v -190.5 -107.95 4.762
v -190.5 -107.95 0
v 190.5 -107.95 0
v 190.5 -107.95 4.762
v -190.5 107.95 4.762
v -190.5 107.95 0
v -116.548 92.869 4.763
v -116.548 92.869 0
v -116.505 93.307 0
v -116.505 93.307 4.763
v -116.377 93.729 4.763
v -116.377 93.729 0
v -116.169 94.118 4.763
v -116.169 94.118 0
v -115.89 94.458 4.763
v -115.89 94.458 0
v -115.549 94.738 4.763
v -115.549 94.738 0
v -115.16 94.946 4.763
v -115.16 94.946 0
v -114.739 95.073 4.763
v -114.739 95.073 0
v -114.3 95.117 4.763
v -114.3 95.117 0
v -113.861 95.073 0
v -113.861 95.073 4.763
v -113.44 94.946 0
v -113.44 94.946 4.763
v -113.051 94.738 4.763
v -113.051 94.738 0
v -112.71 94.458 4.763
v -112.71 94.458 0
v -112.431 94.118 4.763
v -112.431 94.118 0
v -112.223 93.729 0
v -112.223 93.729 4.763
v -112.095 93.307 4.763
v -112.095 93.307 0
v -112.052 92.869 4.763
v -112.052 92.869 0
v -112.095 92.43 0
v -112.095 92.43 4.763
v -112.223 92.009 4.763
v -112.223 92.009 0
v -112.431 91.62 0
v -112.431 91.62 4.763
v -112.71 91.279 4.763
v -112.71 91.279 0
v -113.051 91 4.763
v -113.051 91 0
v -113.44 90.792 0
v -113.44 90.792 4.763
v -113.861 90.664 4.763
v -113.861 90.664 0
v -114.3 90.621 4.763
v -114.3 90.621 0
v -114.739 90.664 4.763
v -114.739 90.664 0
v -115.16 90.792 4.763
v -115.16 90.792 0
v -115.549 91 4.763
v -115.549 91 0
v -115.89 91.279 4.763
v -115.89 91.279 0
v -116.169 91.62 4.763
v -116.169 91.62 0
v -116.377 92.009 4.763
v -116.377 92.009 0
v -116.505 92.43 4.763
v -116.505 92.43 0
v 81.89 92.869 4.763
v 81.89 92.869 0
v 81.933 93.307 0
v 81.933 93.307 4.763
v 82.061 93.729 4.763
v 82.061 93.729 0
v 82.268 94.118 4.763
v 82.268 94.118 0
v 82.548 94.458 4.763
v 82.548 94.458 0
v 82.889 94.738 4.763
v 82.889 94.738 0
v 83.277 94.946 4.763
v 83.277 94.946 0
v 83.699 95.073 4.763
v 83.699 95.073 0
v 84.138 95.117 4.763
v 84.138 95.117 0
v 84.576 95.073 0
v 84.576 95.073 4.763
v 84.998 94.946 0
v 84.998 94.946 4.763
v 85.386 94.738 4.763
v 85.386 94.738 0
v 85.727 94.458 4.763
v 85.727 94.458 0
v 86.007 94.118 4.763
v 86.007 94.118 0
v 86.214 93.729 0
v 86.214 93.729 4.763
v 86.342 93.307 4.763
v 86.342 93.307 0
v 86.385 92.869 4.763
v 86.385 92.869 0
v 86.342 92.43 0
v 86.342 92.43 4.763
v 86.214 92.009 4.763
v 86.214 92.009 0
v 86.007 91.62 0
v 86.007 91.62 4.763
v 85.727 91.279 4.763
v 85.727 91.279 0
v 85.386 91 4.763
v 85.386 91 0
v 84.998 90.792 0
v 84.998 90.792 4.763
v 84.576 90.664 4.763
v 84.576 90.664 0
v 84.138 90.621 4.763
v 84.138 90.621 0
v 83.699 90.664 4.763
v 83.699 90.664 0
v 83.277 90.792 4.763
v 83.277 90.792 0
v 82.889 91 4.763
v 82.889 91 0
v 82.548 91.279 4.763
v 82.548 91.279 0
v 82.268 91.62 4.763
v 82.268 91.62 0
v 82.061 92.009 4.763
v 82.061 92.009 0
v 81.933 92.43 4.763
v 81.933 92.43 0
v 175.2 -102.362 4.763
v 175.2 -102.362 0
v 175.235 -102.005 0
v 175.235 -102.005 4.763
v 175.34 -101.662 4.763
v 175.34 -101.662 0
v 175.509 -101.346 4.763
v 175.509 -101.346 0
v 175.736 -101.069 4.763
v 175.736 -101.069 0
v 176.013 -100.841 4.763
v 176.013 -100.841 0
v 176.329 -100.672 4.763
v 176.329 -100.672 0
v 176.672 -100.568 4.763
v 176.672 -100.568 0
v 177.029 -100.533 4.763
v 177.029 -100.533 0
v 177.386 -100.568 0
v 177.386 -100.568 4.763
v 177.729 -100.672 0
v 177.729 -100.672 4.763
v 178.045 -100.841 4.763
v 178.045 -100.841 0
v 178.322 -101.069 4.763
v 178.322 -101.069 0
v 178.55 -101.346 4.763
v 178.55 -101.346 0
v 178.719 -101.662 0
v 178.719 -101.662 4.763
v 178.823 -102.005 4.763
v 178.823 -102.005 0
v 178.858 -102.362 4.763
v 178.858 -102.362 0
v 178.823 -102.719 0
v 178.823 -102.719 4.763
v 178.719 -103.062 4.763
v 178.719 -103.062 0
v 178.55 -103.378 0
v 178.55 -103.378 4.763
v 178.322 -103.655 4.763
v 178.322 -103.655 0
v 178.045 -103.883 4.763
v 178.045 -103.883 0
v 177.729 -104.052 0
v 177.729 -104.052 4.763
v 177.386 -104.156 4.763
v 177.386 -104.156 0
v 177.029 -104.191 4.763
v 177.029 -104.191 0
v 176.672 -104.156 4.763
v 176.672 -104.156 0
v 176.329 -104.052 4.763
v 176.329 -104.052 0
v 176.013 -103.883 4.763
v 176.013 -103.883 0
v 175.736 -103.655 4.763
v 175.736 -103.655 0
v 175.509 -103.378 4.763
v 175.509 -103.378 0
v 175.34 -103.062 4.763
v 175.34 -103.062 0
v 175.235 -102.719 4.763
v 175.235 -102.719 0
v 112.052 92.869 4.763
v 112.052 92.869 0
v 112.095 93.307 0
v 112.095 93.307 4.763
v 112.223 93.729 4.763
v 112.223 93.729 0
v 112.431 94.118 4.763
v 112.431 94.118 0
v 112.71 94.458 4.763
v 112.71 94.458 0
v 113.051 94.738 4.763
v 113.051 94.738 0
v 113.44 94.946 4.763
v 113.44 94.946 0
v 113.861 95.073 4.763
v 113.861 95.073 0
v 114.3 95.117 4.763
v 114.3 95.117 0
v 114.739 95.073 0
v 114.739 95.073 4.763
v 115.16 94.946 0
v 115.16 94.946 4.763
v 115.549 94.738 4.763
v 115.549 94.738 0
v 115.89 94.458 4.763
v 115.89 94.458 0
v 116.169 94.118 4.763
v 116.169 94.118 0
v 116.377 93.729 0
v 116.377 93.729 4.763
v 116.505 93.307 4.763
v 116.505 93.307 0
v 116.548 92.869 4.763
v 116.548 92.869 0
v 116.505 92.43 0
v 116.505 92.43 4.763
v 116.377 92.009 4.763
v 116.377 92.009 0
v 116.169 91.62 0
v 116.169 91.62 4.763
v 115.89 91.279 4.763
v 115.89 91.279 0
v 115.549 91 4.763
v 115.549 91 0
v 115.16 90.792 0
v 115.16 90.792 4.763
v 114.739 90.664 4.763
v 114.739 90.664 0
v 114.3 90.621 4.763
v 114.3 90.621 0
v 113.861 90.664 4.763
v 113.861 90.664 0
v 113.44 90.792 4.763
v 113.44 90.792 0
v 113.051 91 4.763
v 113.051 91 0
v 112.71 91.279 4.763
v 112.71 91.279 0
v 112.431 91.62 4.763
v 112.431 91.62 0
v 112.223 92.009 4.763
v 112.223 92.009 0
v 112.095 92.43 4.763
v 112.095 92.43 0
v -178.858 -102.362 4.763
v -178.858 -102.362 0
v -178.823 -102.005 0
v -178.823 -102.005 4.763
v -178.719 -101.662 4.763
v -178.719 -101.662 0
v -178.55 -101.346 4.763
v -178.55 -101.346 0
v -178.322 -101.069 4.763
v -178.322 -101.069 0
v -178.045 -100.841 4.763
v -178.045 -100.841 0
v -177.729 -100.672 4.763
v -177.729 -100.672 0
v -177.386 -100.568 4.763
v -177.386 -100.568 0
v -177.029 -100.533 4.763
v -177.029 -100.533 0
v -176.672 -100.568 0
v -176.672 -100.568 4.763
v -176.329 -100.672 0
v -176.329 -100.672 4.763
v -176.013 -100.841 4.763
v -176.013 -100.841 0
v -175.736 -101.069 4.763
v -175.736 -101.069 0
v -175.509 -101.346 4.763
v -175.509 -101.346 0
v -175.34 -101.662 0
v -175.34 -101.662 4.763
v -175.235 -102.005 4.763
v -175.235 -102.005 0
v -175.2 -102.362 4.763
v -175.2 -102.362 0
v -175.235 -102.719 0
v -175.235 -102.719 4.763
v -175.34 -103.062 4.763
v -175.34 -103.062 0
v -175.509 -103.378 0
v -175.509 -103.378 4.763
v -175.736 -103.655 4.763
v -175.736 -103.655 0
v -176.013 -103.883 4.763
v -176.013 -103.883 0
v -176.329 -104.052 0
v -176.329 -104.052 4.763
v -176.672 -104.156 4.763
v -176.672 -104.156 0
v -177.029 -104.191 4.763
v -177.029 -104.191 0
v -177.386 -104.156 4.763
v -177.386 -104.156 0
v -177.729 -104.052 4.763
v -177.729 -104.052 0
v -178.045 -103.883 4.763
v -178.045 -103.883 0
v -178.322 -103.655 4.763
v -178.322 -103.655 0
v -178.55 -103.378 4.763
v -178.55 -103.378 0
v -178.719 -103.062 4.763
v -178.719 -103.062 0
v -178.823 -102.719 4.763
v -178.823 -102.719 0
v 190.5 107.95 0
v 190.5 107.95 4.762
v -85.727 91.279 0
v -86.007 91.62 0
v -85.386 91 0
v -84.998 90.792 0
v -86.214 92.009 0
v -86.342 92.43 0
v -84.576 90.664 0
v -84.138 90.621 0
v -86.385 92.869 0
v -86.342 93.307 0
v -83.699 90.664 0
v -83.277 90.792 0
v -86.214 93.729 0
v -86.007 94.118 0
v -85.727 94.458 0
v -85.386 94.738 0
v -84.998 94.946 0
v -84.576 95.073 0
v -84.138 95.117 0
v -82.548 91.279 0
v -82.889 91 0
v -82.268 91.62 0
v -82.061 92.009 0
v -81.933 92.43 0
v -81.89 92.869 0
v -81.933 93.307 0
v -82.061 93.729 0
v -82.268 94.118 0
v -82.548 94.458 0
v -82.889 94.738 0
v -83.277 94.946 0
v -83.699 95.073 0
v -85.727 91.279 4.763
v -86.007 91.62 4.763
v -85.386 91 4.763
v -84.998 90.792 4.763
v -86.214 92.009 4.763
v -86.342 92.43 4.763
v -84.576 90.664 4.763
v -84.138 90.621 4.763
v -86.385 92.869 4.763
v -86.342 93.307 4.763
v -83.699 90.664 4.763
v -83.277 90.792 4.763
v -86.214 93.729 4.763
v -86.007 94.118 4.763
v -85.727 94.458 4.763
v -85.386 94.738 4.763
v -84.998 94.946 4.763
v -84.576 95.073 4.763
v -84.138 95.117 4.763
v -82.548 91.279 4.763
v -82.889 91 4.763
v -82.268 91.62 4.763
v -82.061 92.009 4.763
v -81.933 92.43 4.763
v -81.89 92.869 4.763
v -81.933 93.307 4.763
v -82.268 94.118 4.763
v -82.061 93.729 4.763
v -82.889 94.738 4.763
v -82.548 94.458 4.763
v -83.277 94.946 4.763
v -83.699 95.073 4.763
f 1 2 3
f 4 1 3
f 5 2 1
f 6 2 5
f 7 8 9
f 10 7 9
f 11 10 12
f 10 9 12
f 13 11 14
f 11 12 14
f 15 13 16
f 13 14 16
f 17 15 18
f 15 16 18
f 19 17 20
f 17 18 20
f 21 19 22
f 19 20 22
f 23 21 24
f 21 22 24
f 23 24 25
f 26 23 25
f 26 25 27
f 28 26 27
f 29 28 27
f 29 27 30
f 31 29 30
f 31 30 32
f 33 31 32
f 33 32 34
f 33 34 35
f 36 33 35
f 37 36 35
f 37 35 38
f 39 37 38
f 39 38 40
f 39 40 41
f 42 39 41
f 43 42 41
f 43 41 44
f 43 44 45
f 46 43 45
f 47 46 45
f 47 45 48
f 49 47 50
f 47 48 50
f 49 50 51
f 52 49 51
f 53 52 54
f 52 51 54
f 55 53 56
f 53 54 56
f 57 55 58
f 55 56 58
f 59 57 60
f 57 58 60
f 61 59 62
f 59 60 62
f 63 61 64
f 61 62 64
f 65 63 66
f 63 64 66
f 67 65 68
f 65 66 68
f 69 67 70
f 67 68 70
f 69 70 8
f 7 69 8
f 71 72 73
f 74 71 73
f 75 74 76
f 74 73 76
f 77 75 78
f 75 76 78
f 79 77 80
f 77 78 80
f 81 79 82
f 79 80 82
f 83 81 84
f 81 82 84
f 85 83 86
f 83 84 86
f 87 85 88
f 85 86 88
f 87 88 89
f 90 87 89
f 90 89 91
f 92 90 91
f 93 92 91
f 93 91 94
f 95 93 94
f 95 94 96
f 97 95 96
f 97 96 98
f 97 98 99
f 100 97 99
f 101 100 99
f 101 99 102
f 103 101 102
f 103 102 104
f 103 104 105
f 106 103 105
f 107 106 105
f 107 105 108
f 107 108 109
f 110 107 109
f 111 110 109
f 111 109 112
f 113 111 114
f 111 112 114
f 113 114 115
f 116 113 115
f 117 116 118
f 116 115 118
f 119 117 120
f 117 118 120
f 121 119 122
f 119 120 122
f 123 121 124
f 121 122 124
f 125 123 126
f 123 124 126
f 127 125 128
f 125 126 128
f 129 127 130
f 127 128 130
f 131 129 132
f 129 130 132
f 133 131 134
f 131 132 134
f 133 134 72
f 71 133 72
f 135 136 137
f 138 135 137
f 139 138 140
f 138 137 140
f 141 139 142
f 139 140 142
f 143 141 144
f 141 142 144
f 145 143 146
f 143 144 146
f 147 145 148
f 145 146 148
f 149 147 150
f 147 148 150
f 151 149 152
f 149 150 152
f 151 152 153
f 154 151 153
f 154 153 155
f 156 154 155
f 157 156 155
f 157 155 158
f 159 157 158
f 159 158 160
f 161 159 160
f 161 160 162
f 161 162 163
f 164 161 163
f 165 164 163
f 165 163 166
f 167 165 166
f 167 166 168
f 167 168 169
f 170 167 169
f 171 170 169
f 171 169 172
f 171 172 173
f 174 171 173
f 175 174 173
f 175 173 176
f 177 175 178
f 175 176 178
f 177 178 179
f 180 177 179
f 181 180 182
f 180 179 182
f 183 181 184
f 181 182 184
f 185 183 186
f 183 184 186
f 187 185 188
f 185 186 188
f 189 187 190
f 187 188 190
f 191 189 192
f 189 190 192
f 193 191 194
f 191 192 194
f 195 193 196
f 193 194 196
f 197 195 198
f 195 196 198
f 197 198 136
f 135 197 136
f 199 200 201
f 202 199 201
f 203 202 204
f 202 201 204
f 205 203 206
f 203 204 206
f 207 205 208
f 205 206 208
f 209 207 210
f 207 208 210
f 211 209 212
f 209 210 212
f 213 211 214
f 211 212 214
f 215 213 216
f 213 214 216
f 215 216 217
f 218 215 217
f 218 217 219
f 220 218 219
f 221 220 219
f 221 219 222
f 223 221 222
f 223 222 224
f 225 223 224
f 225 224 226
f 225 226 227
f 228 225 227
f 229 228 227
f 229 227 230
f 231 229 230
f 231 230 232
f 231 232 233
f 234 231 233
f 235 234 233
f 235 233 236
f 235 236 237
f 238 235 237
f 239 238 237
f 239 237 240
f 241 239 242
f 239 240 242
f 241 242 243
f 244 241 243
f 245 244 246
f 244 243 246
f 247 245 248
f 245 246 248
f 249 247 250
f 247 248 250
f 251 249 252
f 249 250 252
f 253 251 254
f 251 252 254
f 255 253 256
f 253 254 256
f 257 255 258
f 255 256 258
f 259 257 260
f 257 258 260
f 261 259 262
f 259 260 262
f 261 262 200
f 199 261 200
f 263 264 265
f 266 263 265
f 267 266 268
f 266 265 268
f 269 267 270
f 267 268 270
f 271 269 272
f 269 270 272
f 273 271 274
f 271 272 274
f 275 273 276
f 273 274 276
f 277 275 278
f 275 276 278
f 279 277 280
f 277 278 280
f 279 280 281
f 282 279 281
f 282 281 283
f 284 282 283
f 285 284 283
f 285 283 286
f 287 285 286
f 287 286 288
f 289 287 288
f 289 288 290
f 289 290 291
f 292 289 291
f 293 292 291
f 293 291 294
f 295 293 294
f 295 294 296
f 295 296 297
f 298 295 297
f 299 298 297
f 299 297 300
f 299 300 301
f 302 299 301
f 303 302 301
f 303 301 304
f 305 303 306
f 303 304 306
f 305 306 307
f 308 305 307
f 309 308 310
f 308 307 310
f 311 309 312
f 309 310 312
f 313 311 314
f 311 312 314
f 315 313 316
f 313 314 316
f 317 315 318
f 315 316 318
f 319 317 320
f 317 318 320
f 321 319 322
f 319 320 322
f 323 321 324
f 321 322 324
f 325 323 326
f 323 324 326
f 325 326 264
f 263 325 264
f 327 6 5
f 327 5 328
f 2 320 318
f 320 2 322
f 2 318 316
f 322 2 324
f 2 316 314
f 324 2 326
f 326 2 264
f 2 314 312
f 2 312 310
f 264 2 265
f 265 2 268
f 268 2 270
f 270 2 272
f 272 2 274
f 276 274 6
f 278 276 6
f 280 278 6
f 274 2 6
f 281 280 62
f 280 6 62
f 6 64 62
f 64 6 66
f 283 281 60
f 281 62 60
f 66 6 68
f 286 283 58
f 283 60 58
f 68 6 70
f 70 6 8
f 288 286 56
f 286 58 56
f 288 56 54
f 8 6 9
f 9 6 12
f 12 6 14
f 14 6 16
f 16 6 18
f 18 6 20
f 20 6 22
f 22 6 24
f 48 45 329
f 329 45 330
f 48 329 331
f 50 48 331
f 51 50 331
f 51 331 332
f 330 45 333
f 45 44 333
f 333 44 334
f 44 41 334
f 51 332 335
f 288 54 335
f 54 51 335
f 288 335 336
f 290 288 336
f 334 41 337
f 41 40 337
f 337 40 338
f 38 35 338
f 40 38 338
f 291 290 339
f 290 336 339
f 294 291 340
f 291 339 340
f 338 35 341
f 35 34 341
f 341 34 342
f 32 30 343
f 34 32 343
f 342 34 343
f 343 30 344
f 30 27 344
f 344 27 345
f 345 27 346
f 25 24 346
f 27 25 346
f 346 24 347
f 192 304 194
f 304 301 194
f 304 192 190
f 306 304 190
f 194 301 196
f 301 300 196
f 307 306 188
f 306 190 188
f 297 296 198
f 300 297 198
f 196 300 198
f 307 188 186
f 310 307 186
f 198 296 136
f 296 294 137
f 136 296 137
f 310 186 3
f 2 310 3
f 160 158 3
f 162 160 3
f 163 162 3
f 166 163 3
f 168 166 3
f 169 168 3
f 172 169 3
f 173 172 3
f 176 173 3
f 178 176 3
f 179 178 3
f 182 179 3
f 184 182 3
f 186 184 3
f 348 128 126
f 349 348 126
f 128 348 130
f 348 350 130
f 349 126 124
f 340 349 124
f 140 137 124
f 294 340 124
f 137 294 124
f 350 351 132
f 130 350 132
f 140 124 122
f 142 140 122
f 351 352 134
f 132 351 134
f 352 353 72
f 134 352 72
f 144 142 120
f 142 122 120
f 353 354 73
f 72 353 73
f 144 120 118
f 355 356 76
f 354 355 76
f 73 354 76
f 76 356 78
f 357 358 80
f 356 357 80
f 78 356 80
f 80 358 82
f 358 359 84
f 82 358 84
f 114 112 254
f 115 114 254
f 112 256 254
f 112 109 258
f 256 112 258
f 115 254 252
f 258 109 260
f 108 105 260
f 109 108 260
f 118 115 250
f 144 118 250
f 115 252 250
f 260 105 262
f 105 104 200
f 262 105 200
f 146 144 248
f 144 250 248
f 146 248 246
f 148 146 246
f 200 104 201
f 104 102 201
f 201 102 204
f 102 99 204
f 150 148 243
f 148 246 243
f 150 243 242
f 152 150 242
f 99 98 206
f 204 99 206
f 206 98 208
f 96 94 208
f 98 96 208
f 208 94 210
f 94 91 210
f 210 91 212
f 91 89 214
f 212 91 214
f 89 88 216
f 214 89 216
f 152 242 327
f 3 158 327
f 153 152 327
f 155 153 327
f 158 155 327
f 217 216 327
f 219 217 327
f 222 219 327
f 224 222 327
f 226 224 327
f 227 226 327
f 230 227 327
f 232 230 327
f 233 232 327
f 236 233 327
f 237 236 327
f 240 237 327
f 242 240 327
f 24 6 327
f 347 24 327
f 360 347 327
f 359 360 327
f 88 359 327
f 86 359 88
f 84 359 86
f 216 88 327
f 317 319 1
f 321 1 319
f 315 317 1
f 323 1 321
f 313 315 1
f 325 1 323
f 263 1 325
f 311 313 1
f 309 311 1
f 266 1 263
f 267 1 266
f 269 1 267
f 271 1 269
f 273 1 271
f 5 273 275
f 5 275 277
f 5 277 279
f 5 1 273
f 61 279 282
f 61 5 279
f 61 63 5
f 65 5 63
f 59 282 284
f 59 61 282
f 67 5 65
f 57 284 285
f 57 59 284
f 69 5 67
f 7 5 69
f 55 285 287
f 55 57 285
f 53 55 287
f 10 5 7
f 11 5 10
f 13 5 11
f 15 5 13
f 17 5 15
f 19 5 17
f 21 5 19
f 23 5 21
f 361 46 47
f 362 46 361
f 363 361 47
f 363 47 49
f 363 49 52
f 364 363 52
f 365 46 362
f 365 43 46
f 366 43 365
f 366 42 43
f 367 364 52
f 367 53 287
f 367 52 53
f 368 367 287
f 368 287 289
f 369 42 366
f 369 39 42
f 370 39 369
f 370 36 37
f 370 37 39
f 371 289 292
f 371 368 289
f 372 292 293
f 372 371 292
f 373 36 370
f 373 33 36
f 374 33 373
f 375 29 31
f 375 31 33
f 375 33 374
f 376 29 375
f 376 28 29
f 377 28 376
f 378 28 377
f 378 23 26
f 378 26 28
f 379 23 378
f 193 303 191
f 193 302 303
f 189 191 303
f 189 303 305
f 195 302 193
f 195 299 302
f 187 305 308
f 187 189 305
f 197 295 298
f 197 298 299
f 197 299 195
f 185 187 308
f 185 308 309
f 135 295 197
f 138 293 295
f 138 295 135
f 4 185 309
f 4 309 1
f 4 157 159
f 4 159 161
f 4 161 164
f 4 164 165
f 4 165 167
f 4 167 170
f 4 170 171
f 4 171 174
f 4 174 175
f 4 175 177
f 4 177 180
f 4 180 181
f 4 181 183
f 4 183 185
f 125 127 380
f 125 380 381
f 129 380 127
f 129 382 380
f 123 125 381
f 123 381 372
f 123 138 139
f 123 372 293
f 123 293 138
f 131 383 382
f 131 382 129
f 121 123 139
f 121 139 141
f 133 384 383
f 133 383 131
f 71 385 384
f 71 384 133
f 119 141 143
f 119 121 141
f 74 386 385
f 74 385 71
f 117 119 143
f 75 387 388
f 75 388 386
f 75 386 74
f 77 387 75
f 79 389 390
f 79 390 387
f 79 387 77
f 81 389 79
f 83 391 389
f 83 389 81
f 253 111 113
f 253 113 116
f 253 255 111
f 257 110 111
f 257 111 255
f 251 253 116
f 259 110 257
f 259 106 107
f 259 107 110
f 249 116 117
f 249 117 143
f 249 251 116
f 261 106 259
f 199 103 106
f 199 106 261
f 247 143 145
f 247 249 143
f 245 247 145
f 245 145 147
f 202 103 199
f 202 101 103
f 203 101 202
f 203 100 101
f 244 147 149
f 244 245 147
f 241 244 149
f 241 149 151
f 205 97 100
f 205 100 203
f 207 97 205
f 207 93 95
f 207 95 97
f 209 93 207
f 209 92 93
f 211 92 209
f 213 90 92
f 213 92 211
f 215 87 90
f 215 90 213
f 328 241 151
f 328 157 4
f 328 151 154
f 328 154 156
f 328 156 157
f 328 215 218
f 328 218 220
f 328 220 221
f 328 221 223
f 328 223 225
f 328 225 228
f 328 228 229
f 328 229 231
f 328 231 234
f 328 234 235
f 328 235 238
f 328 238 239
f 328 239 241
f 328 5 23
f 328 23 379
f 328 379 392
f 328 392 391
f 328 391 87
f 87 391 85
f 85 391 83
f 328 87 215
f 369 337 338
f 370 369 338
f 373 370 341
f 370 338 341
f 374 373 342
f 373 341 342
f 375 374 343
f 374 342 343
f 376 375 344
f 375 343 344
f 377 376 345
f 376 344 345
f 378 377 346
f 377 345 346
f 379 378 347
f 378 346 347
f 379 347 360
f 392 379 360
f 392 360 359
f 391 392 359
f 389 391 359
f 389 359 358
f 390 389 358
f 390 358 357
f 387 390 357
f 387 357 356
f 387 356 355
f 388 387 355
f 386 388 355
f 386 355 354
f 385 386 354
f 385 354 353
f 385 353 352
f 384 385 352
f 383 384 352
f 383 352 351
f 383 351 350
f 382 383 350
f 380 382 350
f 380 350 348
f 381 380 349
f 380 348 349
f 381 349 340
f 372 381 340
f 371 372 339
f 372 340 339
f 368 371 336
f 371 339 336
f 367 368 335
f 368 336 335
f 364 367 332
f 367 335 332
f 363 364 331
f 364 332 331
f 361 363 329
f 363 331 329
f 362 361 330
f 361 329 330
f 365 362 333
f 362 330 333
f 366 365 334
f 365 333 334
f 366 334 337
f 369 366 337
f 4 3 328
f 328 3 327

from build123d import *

# Parameters (mm, degrees)
SKETCH1_W                 = 381
SKETCH1_H                 = 215.9
BOSS_EXTRUDE1_DEPTH       = 4.7625
F_8_CLEARANCE_HOLE1_D     = 4.4958
F_8_CLEARANCE_HOLE1_DEPTH = 74.422
F_8_CLEARANCE_HOLE1_TIP   = 1.350674586
F_6_CLEARANCE_HOLE1_D     = 3.6576
F_6_CLEARANCE_HOLE1_DEPTH = 74.422
F_6_CLEARANCE_HOLE1_TIP   = 1.0988539


with BuildPart() as part:
    # Sketch1 → Boss-Extrude1 (new body)
    with BuildSketch(Plane.XY):
        Rectangle(SKETCH1_W, SKETCH1_H)
    extrude(amount=BOSS_EXTRUDE1_DEPTH)

    # #8 Clearance Hole1
    with Locations(Plane.XY.offset(4.7625)):
        with Locations((-114.3, 92.86875), (-84.1375, 92.86875), (84.1375, 92.86875), (114.3, 92.86875)):
            Hole(F_8_CLEARANCE_HOLE1_D / 2, depth=F_8_CLEARANCE_HOLE1_DEPTH)
            with Locations((0, 0, -(F_8_CLEARANCE_HOLE1_DEPTH + F_8_CLEARANCE_HOLE1_TIP / 2))):  # 118° drill point
                Cone(0, F_8_CLEARANCE_HOLE1_D / 2, F_8_CLEARANCE_HOLE1_TIP, mode=Mode.SUBTRACT)

    # #6 Clearance Hole1
    with Locations(Plane.XY.offset(4.7625)):
        with Locations((-177.02911, -102.362), (177.02911, -102.362)):
            Hole(F_6_CLEARANCE_HOLE1_D / 2, depth=F_6_CLEARANCE_HOLE1_DEPTH)
            with Locations((0, 0, -(F_6_CLEARANCE_HOLE1_DEPTH + F_6_CLEARANCE_HOLE1_TIP / 2))):  # 118° drill point
                Cone(0, F_6_CLEARANCE_HOLE1_D / 2, F_6_CLEARANCE_HOLE1_TIP, mode=Mode.SUBTRACT)


solid = part.part
